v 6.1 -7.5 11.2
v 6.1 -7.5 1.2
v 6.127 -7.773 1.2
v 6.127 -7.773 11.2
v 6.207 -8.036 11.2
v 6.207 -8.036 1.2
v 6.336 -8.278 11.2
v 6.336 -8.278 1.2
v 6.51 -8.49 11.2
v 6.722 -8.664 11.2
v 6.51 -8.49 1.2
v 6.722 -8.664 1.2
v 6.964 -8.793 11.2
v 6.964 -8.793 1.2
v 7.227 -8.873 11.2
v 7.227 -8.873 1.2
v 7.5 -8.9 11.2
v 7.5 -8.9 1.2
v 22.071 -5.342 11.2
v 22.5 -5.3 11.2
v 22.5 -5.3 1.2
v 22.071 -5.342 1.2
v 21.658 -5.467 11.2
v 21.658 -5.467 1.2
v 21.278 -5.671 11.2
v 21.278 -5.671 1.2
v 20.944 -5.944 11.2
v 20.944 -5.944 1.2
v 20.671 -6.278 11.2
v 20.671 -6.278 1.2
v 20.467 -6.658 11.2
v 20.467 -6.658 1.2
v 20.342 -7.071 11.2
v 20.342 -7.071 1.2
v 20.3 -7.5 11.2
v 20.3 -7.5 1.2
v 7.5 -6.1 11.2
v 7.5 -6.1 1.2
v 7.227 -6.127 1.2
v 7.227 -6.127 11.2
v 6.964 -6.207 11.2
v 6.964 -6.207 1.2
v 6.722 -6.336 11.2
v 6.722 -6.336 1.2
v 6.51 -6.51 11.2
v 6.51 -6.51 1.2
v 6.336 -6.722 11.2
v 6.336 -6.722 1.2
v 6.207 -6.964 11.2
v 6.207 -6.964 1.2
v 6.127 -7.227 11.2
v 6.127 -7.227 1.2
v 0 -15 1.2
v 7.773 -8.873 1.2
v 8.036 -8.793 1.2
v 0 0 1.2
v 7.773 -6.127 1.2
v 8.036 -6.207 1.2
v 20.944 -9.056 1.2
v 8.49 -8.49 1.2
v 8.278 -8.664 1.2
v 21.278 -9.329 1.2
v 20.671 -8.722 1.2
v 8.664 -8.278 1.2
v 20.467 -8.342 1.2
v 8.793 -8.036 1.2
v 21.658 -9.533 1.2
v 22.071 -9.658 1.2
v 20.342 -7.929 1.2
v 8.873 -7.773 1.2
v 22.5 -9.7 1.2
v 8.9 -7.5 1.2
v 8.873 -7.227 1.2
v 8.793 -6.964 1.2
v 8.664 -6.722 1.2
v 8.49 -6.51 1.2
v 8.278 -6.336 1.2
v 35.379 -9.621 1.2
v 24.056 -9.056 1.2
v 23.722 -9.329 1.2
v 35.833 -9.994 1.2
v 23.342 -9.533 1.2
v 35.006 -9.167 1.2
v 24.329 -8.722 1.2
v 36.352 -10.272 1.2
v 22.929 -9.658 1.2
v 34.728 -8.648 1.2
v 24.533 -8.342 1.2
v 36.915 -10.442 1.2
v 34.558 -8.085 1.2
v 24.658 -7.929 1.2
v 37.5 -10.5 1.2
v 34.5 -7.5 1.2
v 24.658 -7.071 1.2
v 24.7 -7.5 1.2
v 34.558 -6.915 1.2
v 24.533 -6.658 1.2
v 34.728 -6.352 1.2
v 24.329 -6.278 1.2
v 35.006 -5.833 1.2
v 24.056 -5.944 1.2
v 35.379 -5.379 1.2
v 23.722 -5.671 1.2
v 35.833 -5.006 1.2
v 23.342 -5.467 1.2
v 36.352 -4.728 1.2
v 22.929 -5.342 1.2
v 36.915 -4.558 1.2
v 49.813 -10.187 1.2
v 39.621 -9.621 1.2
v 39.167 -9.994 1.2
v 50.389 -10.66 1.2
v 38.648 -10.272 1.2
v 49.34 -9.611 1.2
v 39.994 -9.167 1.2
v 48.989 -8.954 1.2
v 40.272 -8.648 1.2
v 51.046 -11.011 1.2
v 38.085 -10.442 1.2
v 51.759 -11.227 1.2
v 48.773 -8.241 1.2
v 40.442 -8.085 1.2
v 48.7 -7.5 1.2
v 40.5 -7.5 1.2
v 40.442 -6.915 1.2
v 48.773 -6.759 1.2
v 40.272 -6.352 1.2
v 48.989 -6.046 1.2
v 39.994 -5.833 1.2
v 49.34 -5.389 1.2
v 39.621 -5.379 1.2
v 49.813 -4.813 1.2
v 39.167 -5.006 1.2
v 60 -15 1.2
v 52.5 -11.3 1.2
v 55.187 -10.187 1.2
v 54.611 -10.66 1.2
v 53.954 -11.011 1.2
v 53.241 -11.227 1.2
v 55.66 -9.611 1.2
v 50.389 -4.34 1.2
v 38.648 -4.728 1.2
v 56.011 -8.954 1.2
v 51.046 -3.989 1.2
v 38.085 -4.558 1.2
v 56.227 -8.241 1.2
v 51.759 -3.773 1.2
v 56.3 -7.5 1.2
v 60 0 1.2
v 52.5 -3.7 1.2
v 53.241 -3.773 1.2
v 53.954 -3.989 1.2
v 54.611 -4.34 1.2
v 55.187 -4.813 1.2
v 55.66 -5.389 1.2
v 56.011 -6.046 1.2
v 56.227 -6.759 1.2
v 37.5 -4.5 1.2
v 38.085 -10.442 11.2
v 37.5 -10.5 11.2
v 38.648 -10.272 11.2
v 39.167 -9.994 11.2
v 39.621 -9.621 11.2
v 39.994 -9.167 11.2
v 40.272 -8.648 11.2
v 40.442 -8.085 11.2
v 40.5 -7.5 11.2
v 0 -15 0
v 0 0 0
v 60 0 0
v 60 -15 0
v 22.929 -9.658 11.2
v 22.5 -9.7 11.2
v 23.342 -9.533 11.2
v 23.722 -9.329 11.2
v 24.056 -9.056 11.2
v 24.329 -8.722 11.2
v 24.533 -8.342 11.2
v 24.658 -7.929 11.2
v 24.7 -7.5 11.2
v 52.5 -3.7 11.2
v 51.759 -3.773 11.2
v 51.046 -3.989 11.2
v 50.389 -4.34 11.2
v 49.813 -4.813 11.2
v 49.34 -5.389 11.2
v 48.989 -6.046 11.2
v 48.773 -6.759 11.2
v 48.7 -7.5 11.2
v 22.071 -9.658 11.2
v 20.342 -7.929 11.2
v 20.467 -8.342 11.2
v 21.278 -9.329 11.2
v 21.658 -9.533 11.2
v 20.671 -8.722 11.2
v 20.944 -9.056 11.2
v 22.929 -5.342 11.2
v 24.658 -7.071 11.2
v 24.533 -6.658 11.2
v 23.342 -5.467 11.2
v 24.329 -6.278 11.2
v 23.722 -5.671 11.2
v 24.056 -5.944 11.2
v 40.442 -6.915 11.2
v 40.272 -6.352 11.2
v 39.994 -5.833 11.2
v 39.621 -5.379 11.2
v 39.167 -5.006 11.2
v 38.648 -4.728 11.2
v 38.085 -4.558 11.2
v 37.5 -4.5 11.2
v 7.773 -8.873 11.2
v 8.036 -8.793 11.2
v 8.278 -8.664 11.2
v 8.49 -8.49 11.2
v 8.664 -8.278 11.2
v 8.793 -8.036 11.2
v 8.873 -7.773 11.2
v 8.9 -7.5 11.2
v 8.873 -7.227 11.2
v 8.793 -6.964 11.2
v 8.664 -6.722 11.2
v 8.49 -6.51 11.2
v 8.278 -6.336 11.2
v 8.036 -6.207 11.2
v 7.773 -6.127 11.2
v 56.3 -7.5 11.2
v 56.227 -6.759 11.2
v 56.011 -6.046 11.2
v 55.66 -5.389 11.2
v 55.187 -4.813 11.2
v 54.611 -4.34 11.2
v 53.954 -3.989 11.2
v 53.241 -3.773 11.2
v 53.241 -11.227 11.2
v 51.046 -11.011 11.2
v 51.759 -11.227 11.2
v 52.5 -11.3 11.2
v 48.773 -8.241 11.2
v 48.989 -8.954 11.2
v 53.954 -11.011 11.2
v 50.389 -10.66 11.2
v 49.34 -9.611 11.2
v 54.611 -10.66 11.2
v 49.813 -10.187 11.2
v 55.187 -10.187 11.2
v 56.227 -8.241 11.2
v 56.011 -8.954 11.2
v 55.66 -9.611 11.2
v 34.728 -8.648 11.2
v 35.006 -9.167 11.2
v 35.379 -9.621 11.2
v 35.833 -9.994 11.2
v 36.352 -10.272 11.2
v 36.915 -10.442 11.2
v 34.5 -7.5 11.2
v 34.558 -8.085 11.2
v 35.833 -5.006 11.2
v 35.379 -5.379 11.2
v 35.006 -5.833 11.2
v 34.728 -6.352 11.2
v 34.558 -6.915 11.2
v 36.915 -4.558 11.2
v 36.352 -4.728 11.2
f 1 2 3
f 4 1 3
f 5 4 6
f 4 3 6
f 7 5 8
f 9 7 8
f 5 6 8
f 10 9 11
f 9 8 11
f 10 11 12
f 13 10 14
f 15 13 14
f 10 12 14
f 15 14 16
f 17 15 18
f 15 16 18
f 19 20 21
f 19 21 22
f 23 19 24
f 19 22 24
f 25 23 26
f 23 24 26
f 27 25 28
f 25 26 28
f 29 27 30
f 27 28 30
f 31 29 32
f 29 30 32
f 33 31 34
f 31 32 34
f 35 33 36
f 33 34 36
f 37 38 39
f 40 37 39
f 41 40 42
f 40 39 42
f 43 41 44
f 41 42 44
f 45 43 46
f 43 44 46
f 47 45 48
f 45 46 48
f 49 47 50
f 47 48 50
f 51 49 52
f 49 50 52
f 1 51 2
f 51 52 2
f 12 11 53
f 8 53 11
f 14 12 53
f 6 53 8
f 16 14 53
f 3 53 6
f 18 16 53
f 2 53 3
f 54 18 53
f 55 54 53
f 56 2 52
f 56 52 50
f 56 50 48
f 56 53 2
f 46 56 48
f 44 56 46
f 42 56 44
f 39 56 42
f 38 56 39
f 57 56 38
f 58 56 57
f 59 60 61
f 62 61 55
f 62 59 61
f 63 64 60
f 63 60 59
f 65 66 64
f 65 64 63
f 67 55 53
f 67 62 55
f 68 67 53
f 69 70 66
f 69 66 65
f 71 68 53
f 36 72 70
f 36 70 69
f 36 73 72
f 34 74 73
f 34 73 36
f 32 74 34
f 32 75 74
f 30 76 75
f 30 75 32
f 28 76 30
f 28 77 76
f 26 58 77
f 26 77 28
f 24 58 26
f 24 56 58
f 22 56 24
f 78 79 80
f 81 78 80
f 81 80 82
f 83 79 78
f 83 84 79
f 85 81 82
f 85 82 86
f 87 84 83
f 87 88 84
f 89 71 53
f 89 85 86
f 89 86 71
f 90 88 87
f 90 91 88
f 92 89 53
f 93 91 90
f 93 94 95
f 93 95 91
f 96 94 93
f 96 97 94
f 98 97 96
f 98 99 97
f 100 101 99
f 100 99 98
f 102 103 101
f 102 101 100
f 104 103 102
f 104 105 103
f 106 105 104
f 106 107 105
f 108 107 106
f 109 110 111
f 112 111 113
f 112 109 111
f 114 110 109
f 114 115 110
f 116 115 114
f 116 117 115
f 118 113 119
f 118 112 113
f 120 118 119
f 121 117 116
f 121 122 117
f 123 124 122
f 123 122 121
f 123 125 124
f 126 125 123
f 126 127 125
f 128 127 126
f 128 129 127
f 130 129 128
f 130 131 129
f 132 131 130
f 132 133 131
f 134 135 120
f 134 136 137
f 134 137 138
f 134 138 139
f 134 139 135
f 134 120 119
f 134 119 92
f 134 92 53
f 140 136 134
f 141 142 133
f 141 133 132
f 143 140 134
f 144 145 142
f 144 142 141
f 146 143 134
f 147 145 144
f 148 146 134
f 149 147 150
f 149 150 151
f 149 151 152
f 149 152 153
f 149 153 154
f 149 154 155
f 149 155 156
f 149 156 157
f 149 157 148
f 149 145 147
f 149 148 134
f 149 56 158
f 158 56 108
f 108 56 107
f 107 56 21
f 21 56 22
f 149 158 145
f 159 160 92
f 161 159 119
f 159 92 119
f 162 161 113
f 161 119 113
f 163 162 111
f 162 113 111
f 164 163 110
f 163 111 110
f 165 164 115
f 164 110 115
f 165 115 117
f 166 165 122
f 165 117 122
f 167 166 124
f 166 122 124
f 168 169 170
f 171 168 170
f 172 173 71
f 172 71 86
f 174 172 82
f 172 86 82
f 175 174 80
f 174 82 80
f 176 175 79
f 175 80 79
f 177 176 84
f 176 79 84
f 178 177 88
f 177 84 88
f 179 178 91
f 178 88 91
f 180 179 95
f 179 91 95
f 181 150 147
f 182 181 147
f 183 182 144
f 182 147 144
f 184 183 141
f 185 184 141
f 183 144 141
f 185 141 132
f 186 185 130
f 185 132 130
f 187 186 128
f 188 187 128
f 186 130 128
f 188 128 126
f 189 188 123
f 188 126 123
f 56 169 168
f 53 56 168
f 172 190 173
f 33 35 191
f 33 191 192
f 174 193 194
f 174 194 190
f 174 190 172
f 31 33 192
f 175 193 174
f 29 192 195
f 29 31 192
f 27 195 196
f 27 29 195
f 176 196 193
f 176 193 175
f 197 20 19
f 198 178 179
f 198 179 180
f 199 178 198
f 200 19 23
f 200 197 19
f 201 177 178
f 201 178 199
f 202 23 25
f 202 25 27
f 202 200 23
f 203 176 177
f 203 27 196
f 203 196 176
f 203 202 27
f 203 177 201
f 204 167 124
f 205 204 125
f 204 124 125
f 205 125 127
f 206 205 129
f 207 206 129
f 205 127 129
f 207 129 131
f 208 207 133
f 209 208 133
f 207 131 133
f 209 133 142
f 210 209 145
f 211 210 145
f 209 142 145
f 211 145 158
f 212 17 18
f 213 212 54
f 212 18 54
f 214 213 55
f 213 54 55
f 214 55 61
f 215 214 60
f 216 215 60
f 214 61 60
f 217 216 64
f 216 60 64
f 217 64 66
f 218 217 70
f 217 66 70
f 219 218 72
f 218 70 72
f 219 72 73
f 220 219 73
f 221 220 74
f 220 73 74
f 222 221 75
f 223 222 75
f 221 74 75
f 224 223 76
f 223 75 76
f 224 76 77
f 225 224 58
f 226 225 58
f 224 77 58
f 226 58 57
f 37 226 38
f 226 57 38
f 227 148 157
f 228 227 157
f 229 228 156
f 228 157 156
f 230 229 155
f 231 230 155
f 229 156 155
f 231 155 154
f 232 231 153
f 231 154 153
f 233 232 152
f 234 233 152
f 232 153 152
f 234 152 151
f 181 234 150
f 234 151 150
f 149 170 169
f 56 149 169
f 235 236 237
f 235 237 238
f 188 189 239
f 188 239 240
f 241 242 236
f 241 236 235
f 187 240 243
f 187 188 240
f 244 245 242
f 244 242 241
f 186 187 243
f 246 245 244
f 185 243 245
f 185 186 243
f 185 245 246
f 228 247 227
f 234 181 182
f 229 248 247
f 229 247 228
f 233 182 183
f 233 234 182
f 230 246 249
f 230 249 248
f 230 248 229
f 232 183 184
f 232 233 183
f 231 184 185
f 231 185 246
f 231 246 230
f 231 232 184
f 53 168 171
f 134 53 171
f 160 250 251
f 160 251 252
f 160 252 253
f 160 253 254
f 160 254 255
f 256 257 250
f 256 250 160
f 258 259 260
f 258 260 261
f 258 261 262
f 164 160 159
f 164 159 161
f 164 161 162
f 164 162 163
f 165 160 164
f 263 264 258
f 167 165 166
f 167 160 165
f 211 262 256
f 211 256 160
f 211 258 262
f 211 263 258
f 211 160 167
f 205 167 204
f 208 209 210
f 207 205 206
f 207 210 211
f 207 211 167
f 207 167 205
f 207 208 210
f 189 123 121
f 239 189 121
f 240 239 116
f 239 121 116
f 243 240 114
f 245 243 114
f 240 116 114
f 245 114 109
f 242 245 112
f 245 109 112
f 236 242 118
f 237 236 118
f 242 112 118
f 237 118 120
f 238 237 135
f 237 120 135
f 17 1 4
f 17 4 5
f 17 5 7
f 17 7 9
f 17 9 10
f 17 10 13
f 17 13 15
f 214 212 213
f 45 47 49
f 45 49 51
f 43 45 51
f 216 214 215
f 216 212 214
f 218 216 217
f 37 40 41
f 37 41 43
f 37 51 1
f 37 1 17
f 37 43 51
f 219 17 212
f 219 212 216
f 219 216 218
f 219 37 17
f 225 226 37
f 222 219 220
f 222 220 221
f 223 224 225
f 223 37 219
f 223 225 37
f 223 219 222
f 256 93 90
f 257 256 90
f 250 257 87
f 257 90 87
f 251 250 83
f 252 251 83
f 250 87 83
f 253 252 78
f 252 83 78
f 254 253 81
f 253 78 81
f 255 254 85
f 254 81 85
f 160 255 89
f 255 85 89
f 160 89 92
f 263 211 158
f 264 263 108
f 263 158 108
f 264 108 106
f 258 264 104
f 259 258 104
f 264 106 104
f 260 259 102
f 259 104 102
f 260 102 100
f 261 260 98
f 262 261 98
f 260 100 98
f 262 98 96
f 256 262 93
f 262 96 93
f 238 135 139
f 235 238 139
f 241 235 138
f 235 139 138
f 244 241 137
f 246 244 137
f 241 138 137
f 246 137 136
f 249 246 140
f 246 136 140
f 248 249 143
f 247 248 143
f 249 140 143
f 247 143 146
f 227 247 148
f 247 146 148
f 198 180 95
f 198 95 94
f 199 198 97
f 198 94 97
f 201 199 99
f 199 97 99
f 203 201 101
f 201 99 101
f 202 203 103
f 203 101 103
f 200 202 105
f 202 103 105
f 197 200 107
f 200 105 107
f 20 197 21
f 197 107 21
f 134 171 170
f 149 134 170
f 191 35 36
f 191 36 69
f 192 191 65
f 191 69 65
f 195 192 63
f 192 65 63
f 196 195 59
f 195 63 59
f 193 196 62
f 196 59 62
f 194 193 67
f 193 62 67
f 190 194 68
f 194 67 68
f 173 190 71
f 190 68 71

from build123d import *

# Parameters (mm, degrees)
F1_DEPTH = 1.2
F2_DEPTH = 11.2


with BuildPart() as f1:
    # F0 (on Top) → F1 (new body)
    with BuildSketch(Plane.XY):
        with BuildLine():
            Line((7.5, 0), (0, 0))
            Line((0, 0), (0, -7.5))
            Line((0, -7.5), (6.1, -7.5))
            ThreePointArc((6.1, -7.5), (6.5100505063, -6.5100505063), (7.5, -6.1))
            Line((7.5, -6.1), (7.5, 0))
        make_face()
        with BuildLine():
            Line((6.1, -7.5), (0, -7.5))
            Line((0, -7.5), (0, -15))
            Line((0, -15), (7.5, -15))
            Line((7.5, -15), (7.5, -8.9))
            ThreePointArc((7.5, -8.9), (6.5100505063, -8.4899494937), (6.1, -7.5))
        make_face()
        with BuildLine():
            Line((20.3, -7.5), (8.9, -7.5))
            ThreePointArc((8.9, -7.5), (8.4899494937, -8.4899494937), (7.5, -8.9))
            Line((7.5, -8.9), (7.5, -15))
            Line((7.5, -15), (22.5, -15))
            Line((22.5, -15), (22.5, -9.7))
            ThreePointArc((22.5, -9.7), (20.9443650814, -9.0556349186), (20.3, -7.5))
        make_face()
        with BuildLine():
            Line((22.5, 0), (7.5, 0))
            Line((7.5, 0), (7.5, -6.1))
            ThreePointArc((7.5, -6.1), (8.4899494937, -6.5100505063), (8.9, -7.5))
            Line((8.9, -7.5), (20.3, -7.5))
            ThreePointArc((20.3, -7.5), (20.9443650814, -5.9443650814), (22.5, -5.3))
            Line((22.5, -5.3), (22.5, 0))
        make_face()
        with BuildLine():
            Line((37.5, 0), (22.5, 0))
            Line((22.5, 0), (22.5, -5.3))
            ThreePointArc((22.5, -5.3), (24.0556349186, -5.9443650814), (24.7, -7.5))
            Line((24.7, -7.5), (34.5, -7.5))
            ThreePointArc((34.5, -7.5), (35.3786796564, -5.3786796564), (37.5, -4.5))
            Line((37.5, -4.5), (37.5, 0))
        make_face()
        with BuildLine():
            Line((34.5, -7.5), (24.7, -7.5))
            ThreePointArc((24.7, -7.5), (24.0556349186, -9.0556349186), (22.5, -9.7))
            Line((22.5, -9.7), (22.5, -15))
            Line((22.5, -15), (37.5, -15))
            Line((37.5, -15), (37.5, -10.5))
            ThreePointArc((37.5, -10.5), (35.3786796564, -9.6213203436), (34.5, -7.5))
        make_face()
        with BuildLine():
            Line((48.7, -7.5), (40.5, -7.5))
            ThreePointArc((40.5, -7.5), (39.6213203436, -9.6213203436), (37.5, -10.5))
            Line((37.5, -10.5), (37.5, -15))
            Line((37.5, -15), (52.5, -15))
            Line((52.5, -15), (52.5, -11.3))
            ThreePointArc((52.5, -11.3), (49.8129942315, -10.1870057685), (48.7, -7.5))
        make_face()
        with BuildLine():
            Line((52.5, 0), (37.5, 0))
            Line((37.5, 0), (37.5, -4.5))
            ThreePointArc((37.5, -4.5), (39.6213203436, -5.3786796564), (40.5, -7.5))
            Line((40.5, -7.5), (48.7, -7.5))
            ThreePointArc((48.7, -7.5), (49.8129942315, -4.8129942315), (52.5, -3.7))
            Line((52.5, -3.7), (52.5, 0))
        make_face()
        with BuildLine():
            Line((60, 0), (52.5, 0))
            Line((52.5, 0), (52.5, -3.7))
            ThreePointArc((52.5, -3.7), (55.1870057685, -4.8129942315), (56.3, -7.5))
            Line((56.3, -7.5), (60, -7.5))
            Line((60, -7.5), (60, 0))
        make_face()
        with BuildLine():
            Line((60, -15), (60, -7.5))
            Line((60, -7.5), (56.3, -7.5))
            ThreePointArc((56.3, -7.5), (55.1870057685, -10.1870057685), (52.5, -11.3))
            Line((52.5, -11.3), (52.5, -15))
            Line((52.5, -15), (60, -15))
        make_face()
    extrude(amount=F1_DEPTH)

    # F0 (on Top) → F2 (join)
    with BuildSketch(Plane.XY):
        with BuildLine():
            Line((7.5, -7.5), (7.5, -6.1))
            ThreePointArc((7.5, -6.1), (6.5100505063, -6.5100505063), (6.1, -7.5))
            Line((6.1, -7.5), (7.5, -7.5))
        make_face()
        with BuildLine():
            ThreePointArc((8.9, -7.5), (8.4899494937, -6.5100505063), (7.5, -6.1))
            Line((7.5, -6.1), (7.5, -7.5))
            Line((7.5, -7.5), (8.9, -7.5))
        make_face()
        with BuildLine():
            Line((8.9, -7.5), (7.5, -7.5))
            Line((7.5, -7.5), (7.5, -8.9))
            ThreePointArc((7.5, -8.9), (8.4899494937, -8.4899494937), (8.9, -7.5))
        make_face()
        with BuildLine():
            Line((7.5, -7.5), (6.1, -7.5))
            ThreePointArc((6.1, -7.5), (6.5100505063, -8.4899494937), (7.5, -8.9))
            Line((7.5, -8.9), (7.5, -7.5))
        make_face()
        with BuildLine():
            Line((22.5, -9.7), (22.5, -7.5))
            Line((22.5, -7.5), (20.3, -7.5))
            ThreePointArc((20.3, -7.5), (20.9443650814, -9.0556349186), (22.5, -9.7))
        make_face()
        with BuildLine():
            Line((22.5, -7.5), (22.5, -5.3))
            ThreePointArc((22.5, -5.3), (20.9443650814, -5.9443650814), (20.3, -7.5))
            Line((20.3, -7.5), (22.5, -7.5))
        make_face()
        with BuildLine():
            ThreePointArc((24.7, -7.5), (24.0556349186, -5.9443650814), (22.5, -5.3))
            Line((22.5, -5.3), (22.5, -7.5))
            Line((22.5, -7.5), (24.7, -7.5))
        make_face()
        with BuildLine():
            Line((24.7, -7.5), (22.5, -7.5))
            Line((22.5, -7.5), (22.5, -9.7))
            ThreePointArc((22.5, -9.7), (24.0556349186, -9.0556349186), (24.7, -7.5))
        make_face()
        with BuildLine():
            ThreePointArc((40.5, -7.5), (39.6213203436, -5.3786796564), (37.5, -4.5))
            Line((37.5, -4.5), (37.5, -7.5))
            Line((37.5, -7.5), (40.5, -7.5))
        make_face()
        with BuildLine():
            Line((37.5, -7.5), (37.5, -4.5))
            ThreePointArc((37.5, -4.5), (35.3786796564, -5.3786796564), (34.5, -7.5))
            Line((34.5, -7.5), (37.5, -7.5))
        make_face()
        with BuildLine():
            Line((37.5, -10.5), (37.5, -7.5))
            Line((37.5, -7.5), (34.5, -7.5))
            ThreePointArc((34.5, -7.5), (35.3786796564, -9.6213203436), (37.5, -10.5))
        make_face()
        with BuildLine():
            Line((40.5, -7.5), (37.5, -7.5))
            Line((37.5, -7.5), (37.5, -10.5))
            ThreePointArc((37.5, -10.5), (39.6213203436, -9.6213203436), (40.5, -7.5))
        make_face()
        with BuildLine():
            Line((52.5, -11.3), (52.5, -7.5))
            Line((52.5, -7.5), (48.7, -7.5))
            ThreePointArc((48.7, -7.5), (49.8129942315, -10.1870057685), (52.5, -11.3))
        make_face()
        with BuildLine():
            Line((52.5, -7.5), (52.5, -3.7))
            ThreePointArc((52.5, -3.7), (49.8129942315, -4.8129942315), (48.7, -7.5))
            Line((48.7, -7.5), (52.5, -7.5))
        make_face()
        with BuildLine():
            ThreePointArc((56.3, -7.5), (55.1870057685, -4.8129942315), (52.5, -3.7))
            Line((52.5, -3.7), (52.5, -7.5))
            Line((52.5, -7.5), (56.3, -7.5))
        make_face()
        with BuildLine():
            Line((56.3, -7.5), (52.5, -7.5))
            Line((52.5, -7.5), (52.5, -11.3))
            ThreePointArc((52.5, -11.3), (55.1870057685, -10.1870057685), (56.3, -7.5))
        make_face()
    extrude(amount=F2_DEPTH)


solid = f1.part
